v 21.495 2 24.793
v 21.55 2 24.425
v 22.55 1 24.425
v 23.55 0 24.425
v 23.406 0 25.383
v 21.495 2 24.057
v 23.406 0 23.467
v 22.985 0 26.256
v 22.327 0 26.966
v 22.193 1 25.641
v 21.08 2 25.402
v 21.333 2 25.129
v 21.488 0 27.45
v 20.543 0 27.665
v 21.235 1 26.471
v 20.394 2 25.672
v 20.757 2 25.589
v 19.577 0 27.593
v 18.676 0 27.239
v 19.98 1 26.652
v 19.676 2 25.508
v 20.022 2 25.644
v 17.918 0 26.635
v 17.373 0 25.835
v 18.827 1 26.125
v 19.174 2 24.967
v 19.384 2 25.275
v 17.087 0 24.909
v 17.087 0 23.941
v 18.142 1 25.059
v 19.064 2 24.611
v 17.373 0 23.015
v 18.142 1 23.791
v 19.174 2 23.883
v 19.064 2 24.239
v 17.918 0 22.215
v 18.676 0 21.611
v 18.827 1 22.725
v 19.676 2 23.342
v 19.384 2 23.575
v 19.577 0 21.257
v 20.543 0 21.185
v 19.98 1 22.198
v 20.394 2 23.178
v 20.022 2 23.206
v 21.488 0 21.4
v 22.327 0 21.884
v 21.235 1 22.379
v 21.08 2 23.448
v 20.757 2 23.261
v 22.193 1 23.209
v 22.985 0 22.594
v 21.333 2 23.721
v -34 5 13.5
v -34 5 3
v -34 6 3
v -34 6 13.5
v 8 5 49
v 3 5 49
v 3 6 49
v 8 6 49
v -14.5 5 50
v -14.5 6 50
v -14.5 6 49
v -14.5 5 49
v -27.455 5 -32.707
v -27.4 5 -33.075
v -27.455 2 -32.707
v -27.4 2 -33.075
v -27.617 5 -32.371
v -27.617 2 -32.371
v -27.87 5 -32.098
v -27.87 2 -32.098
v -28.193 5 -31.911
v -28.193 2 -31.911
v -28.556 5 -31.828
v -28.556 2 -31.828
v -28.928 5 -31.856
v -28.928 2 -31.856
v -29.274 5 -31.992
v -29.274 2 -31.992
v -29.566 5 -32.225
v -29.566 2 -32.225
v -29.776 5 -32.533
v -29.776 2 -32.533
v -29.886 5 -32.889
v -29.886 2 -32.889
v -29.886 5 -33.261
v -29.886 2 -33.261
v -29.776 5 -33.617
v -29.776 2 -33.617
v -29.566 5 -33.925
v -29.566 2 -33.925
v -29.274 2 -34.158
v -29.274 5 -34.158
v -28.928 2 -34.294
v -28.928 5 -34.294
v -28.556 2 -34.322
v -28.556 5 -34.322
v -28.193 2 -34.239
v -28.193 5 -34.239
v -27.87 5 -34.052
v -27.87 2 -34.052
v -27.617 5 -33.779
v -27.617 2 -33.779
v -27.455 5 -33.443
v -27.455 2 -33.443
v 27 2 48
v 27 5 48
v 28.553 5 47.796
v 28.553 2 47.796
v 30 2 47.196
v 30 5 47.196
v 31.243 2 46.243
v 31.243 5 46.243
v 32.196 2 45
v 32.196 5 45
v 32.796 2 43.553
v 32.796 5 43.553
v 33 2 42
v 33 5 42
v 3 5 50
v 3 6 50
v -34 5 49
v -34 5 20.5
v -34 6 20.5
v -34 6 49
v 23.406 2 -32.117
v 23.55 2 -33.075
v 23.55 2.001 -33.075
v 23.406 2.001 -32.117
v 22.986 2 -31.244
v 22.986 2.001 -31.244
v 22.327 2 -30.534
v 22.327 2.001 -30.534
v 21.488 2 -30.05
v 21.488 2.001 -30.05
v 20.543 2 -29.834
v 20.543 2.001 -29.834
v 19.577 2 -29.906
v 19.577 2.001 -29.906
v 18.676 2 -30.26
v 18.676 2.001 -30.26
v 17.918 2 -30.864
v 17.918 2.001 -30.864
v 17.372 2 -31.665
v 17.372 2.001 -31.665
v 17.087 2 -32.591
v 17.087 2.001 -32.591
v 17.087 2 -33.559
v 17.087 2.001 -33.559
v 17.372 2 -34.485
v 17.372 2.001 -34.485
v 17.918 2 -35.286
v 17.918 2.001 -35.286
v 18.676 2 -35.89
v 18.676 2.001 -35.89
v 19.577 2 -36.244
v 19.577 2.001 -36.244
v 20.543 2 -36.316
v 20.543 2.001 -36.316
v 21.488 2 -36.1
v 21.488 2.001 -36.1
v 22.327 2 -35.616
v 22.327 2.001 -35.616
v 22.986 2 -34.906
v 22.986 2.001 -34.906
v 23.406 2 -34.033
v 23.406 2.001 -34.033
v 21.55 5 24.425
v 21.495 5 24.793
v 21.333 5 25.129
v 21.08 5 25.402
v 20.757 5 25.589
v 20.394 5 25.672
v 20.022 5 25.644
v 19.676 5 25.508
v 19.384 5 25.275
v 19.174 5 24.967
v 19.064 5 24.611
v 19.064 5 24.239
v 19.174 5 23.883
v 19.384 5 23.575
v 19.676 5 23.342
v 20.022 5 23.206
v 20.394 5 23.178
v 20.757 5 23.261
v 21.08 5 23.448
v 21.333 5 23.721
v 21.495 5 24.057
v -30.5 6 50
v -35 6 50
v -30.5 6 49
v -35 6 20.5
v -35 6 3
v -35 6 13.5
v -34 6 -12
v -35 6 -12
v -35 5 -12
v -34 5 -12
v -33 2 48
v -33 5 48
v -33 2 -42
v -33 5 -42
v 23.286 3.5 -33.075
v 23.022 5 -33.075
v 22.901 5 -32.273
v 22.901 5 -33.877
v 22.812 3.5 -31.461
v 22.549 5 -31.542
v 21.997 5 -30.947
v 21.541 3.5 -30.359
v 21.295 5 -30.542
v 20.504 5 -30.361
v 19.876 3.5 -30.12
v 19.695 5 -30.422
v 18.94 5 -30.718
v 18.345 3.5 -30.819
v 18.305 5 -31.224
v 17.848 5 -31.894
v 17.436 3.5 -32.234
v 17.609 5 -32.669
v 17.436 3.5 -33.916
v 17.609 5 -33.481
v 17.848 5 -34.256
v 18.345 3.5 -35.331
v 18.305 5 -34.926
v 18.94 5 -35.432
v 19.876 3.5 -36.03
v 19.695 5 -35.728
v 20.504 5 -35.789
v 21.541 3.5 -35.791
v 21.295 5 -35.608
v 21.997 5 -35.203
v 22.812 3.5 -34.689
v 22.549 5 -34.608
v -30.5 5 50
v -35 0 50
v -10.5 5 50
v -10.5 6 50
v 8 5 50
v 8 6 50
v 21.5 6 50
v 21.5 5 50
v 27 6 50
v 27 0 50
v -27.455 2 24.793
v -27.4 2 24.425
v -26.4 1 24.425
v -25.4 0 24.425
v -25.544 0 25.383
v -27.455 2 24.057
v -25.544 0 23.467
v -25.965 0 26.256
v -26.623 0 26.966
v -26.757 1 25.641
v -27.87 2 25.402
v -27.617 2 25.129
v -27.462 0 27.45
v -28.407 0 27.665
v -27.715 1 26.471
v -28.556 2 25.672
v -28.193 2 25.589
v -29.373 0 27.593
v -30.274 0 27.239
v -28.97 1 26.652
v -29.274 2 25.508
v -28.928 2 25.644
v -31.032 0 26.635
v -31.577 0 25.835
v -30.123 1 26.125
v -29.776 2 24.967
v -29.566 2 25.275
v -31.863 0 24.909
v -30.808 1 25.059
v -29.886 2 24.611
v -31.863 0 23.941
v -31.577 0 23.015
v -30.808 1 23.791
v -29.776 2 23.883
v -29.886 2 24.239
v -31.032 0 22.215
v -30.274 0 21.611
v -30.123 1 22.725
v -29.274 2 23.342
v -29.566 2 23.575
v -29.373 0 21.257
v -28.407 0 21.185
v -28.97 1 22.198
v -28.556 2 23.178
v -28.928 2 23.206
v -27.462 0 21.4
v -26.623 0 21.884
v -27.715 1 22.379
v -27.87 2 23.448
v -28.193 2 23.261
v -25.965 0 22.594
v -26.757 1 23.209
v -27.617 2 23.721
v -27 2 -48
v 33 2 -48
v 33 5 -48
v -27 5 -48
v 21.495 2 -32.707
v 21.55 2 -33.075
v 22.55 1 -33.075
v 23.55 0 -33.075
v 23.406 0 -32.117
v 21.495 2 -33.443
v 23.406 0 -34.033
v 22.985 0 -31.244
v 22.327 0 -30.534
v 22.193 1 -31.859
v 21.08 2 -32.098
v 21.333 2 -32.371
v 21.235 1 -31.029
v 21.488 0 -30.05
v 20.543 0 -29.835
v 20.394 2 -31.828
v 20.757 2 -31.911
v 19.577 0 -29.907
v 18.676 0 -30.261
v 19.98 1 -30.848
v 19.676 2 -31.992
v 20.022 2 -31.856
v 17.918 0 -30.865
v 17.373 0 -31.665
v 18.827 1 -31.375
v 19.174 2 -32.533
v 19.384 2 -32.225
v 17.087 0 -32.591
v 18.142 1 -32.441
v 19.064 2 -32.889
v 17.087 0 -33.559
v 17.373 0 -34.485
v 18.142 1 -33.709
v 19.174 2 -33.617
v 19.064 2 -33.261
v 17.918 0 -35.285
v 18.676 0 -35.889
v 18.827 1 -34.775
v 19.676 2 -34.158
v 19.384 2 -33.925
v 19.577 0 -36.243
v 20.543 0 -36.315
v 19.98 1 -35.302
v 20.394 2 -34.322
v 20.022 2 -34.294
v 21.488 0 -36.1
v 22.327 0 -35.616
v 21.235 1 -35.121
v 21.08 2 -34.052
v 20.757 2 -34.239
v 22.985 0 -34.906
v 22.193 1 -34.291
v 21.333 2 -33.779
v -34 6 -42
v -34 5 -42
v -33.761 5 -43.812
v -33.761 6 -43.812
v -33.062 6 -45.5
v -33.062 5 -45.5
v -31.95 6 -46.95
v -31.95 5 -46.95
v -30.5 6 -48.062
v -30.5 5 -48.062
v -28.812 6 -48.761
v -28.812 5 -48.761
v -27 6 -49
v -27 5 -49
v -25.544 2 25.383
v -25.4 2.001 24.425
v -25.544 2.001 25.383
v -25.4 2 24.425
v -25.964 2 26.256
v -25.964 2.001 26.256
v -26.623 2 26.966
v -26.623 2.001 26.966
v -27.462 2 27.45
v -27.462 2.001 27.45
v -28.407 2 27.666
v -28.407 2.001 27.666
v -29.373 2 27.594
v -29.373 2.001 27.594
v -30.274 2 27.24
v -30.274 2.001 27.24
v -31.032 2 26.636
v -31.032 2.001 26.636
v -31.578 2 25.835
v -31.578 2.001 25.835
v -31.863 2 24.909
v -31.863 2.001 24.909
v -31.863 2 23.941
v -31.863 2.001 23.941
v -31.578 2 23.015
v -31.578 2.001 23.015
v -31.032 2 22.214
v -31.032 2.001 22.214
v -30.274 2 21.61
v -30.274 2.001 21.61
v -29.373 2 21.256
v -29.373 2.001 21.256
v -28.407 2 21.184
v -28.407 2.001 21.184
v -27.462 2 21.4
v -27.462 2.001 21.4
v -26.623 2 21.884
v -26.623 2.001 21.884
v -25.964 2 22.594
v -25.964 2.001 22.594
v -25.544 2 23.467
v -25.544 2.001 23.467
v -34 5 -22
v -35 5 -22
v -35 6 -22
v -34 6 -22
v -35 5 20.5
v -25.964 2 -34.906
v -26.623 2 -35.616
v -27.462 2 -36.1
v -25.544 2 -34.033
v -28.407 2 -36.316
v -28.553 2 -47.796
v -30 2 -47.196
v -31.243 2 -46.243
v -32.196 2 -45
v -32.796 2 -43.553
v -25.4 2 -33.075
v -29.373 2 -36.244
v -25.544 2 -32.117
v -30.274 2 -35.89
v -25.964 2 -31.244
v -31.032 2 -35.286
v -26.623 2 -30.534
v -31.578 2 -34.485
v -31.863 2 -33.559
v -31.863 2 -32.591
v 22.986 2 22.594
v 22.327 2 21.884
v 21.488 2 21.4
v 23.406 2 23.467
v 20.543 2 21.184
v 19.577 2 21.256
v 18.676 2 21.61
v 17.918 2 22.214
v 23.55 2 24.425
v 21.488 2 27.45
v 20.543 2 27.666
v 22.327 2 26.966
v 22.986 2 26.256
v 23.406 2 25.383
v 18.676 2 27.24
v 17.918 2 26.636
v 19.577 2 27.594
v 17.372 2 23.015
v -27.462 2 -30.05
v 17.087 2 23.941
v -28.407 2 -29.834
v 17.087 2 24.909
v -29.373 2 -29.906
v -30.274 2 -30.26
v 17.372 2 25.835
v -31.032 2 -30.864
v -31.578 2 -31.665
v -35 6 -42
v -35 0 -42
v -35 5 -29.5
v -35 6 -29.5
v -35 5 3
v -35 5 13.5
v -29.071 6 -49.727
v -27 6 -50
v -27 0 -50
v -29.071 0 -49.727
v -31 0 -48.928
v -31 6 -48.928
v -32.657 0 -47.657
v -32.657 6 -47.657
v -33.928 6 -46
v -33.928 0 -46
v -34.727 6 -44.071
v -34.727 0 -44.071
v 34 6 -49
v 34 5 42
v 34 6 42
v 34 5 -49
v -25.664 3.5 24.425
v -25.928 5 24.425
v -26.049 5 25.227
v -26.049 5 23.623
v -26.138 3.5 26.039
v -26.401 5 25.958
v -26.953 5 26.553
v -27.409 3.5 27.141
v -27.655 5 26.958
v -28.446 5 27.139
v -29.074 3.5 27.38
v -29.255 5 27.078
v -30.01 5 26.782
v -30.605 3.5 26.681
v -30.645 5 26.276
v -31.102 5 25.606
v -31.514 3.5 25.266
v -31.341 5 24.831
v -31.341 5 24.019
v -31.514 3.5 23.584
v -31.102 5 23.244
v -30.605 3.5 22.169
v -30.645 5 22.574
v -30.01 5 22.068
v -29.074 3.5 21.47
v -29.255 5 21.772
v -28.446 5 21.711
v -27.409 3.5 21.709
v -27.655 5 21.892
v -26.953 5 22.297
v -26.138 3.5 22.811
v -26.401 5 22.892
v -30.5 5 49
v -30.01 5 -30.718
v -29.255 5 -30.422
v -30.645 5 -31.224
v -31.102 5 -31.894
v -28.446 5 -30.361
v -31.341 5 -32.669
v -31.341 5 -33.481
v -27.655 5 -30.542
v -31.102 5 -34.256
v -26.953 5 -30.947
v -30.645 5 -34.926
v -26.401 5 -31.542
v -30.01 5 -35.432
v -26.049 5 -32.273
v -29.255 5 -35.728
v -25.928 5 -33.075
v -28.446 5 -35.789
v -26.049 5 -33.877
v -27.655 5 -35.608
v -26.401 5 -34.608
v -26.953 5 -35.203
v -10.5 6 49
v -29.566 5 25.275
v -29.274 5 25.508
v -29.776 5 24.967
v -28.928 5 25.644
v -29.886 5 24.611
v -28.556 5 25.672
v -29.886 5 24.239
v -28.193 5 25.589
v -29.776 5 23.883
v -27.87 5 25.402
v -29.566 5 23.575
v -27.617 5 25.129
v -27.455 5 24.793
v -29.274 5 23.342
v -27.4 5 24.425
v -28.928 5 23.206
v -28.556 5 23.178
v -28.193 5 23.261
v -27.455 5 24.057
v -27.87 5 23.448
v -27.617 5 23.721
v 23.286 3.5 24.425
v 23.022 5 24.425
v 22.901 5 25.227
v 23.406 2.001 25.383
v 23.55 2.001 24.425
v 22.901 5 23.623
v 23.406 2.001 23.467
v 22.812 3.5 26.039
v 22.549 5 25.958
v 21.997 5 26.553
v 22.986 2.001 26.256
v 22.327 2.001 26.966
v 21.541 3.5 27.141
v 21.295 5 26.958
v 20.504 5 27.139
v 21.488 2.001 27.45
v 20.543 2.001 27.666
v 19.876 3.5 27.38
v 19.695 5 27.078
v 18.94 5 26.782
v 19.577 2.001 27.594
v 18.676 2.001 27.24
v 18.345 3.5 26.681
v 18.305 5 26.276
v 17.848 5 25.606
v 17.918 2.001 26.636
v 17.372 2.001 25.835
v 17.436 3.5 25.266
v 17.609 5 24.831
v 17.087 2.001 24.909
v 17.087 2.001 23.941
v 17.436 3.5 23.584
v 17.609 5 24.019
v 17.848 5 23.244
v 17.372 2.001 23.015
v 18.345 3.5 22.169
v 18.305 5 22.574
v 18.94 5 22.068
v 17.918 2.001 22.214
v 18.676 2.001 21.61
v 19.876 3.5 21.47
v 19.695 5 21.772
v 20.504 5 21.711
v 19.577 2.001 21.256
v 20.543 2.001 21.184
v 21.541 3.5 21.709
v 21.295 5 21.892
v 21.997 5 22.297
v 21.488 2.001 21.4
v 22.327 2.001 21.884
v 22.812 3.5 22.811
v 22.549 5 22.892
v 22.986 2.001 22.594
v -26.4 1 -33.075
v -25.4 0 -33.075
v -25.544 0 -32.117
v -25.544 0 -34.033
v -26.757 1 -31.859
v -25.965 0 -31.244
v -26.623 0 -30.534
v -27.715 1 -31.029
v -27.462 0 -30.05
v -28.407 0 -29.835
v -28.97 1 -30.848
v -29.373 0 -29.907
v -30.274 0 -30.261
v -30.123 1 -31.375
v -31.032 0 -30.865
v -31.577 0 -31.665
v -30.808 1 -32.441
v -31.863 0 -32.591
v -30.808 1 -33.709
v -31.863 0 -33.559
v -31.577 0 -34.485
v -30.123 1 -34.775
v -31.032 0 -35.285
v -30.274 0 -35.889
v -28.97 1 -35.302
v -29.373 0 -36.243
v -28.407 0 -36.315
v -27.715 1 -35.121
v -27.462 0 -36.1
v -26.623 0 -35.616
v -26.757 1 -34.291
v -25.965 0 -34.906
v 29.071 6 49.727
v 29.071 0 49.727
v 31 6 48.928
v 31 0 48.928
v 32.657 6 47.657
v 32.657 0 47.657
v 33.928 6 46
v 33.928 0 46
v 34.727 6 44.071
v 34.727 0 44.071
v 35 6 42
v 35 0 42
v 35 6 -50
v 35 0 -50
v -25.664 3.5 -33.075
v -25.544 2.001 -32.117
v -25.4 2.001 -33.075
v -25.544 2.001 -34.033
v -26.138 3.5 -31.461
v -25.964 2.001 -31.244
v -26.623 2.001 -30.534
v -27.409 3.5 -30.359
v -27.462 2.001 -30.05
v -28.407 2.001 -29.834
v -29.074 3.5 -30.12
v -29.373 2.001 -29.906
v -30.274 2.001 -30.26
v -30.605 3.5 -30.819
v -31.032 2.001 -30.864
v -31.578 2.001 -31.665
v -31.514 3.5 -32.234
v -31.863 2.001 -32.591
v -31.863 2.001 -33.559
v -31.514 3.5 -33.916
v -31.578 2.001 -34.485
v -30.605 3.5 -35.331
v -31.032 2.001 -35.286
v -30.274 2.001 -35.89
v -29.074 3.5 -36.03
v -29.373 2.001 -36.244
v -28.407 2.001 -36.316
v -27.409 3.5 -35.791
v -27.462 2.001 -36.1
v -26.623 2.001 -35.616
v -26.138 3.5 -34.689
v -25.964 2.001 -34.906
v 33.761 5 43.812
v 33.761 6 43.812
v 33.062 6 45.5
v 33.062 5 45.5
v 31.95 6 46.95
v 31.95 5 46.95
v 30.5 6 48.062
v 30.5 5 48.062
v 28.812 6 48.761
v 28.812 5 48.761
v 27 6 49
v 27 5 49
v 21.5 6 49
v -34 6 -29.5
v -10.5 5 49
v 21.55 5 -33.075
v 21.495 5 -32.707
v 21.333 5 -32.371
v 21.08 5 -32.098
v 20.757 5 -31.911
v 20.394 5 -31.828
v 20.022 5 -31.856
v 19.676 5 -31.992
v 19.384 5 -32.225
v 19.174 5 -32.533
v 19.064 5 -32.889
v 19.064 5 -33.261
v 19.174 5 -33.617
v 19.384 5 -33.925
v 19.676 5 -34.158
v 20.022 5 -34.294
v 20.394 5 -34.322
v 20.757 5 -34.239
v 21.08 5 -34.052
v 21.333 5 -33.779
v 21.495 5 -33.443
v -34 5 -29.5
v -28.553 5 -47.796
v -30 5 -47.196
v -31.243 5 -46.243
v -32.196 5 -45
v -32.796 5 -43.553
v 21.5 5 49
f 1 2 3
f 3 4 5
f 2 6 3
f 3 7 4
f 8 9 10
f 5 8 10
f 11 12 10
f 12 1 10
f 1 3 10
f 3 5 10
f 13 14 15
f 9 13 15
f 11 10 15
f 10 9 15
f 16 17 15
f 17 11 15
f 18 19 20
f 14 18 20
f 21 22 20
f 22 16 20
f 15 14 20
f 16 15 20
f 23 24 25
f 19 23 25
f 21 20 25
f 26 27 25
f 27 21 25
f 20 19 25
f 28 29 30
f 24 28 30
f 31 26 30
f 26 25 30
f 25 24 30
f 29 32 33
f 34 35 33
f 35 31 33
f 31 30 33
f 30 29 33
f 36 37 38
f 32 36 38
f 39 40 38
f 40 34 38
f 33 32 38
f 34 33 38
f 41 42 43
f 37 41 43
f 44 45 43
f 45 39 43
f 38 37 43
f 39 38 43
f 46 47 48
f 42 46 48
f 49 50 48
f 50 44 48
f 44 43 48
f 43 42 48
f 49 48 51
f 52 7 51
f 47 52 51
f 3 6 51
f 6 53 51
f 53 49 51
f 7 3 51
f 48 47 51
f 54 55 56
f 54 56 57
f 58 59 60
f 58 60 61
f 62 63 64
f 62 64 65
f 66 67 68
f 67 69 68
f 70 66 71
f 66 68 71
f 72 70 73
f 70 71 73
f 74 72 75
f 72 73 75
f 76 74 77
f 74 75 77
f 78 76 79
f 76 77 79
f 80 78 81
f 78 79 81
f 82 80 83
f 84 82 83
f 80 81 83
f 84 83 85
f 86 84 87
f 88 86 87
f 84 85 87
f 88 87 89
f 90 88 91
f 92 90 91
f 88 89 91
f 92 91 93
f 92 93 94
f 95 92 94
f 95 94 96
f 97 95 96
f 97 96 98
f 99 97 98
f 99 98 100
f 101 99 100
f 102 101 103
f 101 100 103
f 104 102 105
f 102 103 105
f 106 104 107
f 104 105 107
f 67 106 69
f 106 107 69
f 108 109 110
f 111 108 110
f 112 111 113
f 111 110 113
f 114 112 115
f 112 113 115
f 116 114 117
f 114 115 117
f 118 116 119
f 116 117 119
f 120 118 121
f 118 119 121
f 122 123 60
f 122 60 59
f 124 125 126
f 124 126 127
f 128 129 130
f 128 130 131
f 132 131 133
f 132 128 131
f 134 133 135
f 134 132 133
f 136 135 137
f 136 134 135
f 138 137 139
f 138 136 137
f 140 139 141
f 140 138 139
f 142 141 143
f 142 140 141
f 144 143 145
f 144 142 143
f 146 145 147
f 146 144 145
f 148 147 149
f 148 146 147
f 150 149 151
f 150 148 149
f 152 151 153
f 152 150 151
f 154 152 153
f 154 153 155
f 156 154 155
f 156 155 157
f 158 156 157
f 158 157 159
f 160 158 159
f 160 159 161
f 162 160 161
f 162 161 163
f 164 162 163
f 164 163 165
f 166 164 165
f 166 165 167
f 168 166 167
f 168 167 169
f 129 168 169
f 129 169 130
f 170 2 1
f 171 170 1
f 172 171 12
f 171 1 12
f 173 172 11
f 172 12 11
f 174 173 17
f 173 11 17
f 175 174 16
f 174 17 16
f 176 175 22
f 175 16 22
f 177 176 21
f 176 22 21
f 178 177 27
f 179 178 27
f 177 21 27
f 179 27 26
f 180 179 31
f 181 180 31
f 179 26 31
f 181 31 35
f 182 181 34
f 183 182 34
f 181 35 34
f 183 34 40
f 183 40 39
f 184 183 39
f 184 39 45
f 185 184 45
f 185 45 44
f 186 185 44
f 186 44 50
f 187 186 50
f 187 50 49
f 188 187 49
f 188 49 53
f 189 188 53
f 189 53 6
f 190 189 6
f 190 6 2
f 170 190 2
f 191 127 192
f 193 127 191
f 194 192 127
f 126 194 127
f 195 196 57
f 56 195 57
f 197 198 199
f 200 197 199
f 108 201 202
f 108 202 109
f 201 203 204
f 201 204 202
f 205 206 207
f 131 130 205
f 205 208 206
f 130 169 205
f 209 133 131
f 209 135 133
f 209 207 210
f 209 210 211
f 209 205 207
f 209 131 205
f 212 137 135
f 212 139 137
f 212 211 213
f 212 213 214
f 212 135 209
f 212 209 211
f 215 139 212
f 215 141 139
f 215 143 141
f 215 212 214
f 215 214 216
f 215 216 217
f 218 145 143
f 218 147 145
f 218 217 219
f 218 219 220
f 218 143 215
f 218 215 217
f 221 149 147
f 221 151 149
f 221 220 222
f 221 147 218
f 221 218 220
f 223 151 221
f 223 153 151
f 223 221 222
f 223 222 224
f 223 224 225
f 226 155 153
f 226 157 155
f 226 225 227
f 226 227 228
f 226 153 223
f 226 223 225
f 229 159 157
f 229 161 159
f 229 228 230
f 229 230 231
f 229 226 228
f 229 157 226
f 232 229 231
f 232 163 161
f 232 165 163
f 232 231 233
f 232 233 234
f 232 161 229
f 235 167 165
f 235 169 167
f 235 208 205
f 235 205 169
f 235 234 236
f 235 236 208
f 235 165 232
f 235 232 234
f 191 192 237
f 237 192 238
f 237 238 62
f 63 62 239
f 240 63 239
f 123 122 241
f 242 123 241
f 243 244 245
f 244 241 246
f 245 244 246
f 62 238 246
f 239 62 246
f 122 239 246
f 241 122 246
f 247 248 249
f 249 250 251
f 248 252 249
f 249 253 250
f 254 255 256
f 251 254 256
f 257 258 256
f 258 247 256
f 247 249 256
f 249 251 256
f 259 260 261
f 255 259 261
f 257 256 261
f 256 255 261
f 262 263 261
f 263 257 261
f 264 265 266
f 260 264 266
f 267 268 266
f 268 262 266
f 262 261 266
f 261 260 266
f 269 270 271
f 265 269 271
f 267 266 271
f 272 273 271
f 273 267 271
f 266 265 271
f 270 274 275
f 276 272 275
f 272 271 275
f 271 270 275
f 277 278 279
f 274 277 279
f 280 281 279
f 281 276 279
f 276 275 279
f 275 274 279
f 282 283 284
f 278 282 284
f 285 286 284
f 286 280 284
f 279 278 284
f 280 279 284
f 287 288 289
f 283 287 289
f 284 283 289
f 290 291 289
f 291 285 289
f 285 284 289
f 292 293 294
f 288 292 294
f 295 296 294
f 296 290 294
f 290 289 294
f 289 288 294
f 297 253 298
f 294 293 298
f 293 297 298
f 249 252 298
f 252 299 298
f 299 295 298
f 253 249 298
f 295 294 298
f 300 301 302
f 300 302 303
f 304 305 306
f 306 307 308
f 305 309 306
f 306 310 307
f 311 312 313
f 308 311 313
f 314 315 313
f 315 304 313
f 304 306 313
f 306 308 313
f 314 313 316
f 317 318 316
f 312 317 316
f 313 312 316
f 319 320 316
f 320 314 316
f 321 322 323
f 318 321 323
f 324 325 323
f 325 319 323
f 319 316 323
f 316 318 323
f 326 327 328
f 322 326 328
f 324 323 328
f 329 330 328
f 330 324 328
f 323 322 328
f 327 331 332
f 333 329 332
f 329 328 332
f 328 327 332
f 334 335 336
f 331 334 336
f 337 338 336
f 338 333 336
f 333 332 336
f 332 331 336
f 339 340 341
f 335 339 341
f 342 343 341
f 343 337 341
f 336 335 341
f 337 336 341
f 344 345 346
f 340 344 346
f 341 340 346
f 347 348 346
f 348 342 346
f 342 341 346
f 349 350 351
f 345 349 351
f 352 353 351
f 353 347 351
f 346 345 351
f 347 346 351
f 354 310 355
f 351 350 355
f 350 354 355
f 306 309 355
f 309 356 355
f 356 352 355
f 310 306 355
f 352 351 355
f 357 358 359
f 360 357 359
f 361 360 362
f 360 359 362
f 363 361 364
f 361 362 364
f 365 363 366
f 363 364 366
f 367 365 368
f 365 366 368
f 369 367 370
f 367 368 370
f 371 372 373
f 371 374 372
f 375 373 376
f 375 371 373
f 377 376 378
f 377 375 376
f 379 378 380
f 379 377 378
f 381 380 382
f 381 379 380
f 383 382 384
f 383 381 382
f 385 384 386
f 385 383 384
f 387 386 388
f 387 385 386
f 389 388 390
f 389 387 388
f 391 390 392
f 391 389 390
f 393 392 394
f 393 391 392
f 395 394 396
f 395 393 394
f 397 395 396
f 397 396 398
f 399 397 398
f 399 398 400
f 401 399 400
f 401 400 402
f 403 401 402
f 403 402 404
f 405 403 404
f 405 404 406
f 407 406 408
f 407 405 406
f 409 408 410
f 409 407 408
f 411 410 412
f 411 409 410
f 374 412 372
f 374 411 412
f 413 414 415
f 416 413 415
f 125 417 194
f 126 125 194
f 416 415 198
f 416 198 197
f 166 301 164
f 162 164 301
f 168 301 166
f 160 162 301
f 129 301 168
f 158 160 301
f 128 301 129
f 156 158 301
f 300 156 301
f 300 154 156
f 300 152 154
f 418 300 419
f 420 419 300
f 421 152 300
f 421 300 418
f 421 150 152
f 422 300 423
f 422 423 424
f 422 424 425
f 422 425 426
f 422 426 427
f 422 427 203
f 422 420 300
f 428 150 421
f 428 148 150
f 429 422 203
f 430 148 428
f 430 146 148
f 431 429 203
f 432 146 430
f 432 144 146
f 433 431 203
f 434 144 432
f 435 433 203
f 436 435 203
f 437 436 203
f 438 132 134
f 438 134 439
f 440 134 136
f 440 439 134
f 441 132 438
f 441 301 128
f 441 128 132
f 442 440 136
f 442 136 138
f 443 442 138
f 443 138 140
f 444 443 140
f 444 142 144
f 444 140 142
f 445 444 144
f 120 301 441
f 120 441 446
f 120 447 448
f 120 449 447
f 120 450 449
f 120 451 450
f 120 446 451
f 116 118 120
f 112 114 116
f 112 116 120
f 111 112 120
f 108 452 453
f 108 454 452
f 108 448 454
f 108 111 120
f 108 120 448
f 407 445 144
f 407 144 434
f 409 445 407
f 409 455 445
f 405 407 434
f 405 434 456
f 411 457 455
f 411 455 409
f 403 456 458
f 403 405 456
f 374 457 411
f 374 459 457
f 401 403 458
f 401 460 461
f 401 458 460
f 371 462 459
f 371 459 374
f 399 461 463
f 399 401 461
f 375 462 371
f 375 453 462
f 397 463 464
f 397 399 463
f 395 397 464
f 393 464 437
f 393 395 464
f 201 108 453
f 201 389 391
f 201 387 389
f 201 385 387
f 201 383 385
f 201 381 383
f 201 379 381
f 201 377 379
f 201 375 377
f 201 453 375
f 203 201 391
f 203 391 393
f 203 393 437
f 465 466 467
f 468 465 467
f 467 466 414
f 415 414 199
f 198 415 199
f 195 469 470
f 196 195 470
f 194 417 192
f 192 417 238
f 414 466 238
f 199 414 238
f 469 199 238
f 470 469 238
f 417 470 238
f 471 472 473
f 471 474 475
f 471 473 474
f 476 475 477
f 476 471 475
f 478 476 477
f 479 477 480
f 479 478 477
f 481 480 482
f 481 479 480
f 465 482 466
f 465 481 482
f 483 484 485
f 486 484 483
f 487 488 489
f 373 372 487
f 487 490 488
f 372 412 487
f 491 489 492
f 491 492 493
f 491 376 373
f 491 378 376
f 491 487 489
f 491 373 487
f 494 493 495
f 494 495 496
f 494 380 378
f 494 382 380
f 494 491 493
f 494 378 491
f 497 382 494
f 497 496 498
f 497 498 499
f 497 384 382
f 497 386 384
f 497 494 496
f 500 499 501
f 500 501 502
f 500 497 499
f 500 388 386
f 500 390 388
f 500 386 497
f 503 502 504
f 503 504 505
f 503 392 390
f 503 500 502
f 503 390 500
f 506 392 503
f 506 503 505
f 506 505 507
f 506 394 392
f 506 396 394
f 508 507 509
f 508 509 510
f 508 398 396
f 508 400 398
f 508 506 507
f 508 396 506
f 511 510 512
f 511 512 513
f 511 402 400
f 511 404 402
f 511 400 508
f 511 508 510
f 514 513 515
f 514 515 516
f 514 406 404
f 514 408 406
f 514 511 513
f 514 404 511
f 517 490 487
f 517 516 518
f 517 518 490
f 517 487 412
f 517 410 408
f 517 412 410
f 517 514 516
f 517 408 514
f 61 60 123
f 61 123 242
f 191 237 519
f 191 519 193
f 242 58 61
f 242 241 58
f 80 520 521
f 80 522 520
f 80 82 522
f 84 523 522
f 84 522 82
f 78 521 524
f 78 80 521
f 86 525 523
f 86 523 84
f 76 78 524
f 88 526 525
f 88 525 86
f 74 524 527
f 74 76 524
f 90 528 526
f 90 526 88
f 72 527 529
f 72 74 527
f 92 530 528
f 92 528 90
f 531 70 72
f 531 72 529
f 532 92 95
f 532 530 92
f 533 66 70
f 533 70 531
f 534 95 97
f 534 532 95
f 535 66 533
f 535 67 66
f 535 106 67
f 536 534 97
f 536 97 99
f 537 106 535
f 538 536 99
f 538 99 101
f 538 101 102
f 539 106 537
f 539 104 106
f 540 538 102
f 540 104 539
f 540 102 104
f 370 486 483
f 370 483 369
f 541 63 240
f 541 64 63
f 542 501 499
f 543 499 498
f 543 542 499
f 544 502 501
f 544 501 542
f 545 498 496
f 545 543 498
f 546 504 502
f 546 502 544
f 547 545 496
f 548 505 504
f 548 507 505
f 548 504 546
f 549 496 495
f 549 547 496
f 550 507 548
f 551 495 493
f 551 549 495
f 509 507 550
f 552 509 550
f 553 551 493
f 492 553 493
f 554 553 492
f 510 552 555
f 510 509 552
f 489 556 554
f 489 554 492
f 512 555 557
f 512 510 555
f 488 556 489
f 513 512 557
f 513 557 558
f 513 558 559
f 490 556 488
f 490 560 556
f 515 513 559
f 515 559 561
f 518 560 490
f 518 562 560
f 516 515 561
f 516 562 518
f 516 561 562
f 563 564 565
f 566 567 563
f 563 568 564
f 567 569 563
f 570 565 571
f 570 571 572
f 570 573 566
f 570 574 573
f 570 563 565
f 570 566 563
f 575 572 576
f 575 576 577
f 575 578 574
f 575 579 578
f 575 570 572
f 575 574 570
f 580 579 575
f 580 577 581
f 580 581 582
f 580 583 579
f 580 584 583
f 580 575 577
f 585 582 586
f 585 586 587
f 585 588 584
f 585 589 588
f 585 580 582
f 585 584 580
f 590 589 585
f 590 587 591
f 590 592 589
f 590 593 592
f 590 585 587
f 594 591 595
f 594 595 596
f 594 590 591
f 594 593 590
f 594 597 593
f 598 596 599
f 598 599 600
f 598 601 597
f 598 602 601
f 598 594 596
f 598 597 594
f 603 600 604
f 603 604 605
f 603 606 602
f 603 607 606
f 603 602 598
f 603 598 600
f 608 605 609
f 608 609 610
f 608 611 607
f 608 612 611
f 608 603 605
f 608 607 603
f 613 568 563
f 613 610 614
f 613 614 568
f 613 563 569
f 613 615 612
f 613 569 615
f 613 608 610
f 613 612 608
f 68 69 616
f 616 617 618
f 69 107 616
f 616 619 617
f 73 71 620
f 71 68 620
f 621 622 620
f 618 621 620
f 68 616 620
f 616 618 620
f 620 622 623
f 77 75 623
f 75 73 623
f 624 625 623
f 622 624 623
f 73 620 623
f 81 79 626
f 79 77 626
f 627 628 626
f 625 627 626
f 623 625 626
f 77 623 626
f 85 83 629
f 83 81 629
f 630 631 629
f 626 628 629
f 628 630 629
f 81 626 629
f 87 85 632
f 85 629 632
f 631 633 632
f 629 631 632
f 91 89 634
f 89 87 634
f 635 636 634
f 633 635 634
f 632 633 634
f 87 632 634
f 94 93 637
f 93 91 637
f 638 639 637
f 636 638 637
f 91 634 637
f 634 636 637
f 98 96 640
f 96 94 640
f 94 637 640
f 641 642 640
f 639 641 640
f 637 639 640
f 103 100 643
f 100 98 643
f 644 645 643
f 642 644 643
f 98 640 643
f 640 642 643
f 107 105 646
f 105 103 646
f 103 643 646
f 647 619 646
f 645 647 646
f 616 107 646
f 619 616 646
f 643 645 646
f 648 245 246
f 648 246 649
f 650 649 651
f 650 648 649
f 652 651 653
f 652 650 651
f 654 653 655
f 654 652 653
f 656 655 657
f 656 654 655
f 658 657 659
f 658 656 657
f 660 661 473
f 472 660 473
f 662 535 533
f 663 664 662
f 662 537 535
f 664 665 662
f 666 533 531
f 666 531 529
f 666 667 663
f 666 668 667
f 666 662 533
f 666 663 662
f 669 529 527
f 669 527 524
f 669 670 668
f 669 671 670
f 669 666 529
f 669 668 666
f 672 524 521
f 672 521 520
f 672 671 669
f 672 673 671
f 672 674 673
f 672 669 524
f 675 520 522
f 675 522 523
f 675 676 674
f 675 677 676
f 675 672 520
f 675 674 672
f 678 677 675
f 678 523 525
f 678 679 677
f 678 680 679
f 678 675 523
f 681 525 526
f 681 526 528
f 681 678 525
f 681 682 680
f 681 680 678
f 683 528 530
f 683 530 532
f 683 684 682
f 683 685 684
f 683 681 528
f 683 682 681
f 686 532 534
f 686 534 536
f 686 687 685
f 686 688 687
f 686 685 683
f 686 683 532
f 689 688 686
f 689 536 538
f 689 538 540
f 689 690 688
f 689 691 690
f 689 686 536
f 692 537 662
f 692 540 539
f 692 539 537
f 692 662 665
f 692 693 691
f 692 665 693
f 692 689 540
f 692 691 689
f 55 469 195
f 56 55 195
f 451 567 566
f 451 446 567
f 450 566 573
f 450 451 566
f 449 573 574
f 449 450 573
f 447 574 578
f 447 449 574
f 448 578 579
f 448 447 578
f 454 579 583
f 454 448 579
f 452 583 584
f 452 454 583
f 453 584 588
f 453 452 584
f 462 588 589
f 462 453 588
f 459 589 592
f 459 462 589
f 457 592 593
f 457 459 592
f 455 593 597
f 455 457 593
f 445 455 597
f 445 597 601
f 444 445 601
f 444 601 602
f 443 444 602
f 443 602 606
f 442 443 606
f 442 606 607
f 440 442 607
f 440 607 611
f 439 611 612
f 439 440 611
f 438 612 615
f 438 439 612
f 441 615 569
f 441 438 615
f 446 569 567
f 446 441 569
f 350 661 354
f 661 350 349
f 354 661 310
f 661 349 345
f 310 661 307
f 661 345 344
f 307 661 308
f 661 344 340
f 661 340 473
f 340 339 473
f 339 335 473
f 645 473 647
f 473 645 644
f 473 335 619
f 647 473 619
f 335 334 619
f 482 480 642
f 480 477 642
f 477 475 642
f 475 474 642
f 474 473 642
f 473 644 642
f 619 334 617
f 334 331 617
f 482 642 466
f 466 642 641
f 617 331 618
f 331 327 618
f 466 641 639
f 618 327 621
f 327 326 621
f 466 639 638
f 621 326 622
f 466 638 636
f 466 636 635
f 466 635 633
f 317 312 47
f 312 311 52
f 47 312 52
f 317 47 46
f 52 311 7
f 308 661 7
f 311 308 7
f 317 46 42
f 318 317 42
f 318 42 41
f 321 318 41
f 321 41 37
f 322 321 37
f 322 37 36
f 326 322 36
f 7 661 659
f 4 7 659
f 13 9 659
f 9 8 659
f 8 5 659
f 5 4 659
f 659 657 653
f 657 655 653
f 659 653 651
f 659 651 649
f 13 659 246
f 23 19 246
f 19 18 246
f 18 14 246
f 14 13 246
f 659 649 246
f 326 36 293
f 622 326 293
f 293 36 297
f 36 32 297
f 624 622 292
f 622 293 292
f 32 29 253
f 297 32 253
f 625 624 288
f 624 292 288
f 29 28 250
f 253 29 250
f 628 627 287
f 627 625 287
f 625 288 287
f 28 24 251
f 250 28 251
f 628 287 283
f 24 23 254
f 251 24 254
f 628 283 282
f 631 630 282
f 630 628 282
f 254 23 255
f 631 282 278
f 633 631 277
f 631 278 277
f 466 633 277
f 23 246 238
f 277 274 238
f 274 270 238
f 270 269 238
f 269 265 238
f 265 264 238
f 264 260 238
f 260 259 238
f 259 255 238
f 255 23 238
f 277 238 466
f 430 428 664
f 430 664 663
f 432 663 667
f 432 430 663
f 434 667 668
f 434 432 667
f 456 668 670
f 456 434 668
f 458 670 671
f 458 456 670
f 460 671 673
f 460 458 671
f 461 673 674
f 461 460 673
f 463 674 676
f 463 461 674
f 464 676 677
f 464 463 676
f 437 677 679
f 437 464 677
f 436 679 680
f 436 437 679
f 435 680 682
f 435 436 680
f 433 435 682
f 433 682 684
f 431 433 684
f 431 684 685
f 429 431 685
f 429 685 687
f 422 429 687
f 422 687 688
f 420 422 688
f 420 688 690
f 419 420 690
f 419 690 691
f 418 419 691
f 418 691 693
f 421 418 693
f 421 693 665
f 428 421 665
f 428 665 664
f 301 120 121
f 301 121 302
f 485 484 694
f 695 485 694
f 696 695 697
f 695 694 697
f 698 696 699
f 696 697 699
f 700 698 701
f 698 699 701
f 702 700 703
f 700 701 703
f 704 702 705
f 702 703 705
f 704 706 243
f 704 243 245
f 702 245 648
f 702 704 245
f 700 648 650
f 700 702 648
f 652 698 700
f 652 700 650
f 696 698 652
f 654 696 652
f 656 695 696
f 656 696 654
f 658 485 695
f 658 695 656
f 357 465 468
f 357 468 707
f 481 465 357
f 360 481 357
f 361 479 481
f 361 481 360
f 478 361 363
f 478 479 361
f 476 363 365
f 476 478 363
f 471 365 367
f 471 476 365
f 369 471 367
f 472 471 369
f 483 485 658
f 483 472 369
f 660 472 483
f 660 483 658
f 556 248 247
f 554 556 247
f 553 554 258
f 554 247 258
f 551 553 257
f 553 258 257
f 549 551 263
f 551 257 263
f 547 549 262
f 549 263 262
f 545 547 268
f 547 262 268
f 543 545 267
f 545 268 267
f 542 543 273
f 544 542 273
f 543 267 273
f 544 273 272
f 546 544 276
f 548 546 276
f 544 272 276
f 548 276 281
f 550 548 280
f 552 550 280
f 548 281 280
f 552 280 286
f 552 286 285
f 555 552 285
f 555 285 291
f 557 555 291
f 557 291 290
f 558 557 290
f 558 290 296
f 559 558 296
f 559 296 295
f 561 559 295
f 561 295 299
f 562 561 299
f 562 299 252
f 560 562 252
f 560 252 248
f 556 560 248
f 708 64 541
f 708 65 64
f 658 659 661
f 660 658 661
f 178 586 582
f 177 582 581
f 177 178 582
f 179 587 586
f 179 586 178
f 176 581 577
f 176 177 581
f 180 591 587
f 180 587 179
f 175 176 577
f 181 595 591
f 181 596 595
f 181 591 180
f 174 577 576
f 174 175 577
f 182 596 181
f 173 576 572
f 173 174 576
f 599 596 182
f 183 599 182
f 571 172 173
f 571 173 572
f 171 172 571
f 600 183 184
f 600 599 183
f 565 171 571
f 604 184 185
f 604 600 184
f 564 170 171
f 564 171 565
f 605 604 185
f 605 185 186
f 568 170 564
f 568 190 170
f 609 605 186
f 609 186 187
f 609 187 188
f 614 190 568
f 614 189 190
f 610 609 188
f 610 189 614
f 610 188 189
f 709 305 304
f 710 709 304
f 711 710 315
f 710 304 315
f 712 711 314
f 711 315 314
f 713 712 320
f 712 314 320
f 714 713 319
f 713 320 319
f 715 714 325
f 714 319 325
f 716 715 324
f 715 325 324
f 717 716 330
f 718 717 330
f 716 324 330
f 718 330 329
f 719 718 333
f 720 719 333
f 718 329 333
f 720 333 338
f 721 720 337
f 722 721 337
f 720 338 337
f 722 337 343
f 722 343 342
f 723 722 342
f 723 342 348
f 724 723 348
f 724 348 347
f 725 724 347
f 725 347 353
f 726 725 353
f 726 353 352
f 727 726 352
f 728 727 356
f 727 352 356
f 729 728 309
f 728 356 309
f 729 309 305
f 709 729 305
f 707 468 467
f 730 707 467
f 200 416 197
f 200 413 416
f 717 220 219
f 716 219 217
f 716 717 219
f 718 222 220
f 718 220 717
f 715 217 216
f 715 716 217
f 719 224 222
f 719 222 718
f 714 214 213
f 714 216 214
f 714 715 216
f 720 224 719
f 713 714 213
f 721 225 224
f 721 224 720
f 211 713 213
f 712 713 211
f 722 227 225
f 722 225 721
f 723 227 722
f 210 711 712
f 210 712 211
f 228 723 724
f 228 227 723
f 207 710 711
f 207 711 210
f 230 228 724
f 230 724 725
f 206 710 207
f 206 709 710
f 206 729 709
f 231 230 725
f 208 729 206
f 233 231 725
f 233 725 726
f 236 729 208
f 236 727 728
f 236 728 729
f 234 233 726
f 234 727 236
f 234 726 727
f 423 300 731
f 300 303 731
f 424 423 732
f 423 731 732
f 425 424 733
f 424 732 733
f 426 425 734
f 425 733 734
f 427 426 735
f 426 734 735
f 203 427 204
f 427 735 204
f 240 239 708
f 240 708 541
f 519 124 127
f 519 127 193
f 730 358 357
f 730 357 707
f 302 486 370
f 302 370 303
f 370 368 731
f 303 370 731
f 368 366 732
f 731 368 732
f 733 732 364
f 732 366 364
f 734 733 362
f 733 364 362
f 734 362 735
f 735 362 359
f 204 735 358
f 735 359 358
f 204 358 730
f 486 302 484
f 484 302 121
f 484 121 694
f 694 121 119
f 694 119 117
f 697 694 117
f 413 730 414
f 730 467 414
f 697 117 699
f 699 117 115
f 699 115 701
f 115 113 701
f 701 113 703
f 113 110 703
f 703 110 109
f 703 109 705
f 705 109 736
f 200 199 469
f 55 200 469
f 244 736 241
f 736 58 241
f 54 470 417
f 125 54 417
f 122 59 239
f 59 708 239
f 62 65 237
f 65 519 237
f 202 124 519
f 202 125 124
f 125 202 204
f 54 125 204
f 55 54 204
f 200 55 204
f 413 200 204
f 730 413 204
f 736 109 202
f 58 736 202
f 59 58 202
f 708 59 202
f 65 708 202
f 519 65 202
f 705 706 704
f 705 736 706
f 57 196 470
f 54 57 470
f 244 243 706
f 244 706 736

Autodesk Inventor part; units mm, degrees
ref_plane "YZ Plane" through (0, 0, 0) normal (1, 0, 0) x (0, 1, 0)
ref_plane "XZ Plane" through (0, 0, 0) normal (0, 1, 0) x (-1, 0, 0)
ref_plane "XY Plane" through (0, 0, 0) normal (0, 0, 1) x (1, 0, 0)
sketch "base" plane through (0, 0, 0) normal (0, 1, 0) x (-1, 0, 0)
  line L0 (35, 50) -> (-35, 50)
  line L1 (-35, 50) -> (-35, -50)
  line L2 (-35, -50) -> (35, -50)
  line L3 (35, -50) -> (35, 50)
  point P0 (0, 0)
  point P1 (0, 0)
  dimension "d0" = 70
  dimension "d1" = 100
  dimension "d2" = 50
  dimension "d3" = 35
  dimension "d4" = 0
  dimension "d5" = 0
extrude "baseBody" add sketch "base" along normal blind 5
fillet "filletBaseBody" radius 8 2 edges at (-35, 2.5, -50) (35, 2.5, 50)
shell "shellBaseBody" thickness 2 removed faces 1 at (11.6667, 5, -16.6667)
sketch "baseBorderCase" plane through (0, 5, 0) normal (0, 1, 0) x (1, 0, 0)
  line L0 (-35, -50) -> (27, -50)
  line L1 (35, -42) -> (35, 50)
  line L2 (35, 50) -> (-27, 50)
  line L3 (-35, 42) -> (-35, -50)
  arc A0 (-27, 50) -> (-35, 42) centre (-27, 42) ccw
  arc A1 (27, -50) -> (35, -42) centre (27, -42) ccw
  line L4 (-34, -49) -> (27, -49)
  arc A2 (27, -49) -> (34, -42) centre (27, -42) ccw
  line L5 (34, -42) -> (34, 49)
  line L6 (34, 49) -> (-27, 49)
  arc A3 (-27, 49) -> (-34, 42) centre (-27, 42) ccw
  line L7 (-34, 42) -> (-34, -49)
  point P0 (0, 0)
  dimension "d10" = 8
  dimension "d11" = 1
extrude "borderCase" add sketch "baseBorderCase" along normal blind 1
sketch "baseFrontHoles" plane through (-35, 0, 50) normal (0, 0, 1) x (1, 0, 0)
  line L0 (2, 2) -> (2, 5)
  line L1 (2, 2) -> (2, 5) projected
  line L2 (2, 5) -> (4.5, 5)
  line L3 (4.5, 5) -> (4.5, 18.5)
  line L4 (4.5, 18.5) -> (20.5, 18.5)
  line L5 (20.5, 18.5) -> (20.5, 5)
  line L6 (20.5, 5) -> (4.5, 5)
  line L7 (20.5, 5) -> (24.5, 5)
  line L8 (24.5, 5) -> (24.5, 19.5)
  line L9 (24.5, 19.5) -> (38, 19.5)
  line L10 (38, 19.5) -> (38, 5)
  line L11 (38, 5) -> (24.5, 5)
  line L12 (38, 5) -> (43, 5)
  line L13 (43, 5) -> (43, 19.5)
  line L14 (43, 19.5) -> (56.5, 19.5)
  line L15 (56.5, 19.5) -> (56.5, 5)
  line L16 (56.5, 5) -> (43, 5)
  point P0 (35, 0)
  dimension "d14" = 3
  dimension "d15" = 2.5
  dimension "d16" = 13.5
  dimension "d17" = 16
  dimension "d18" = 13.5
  dimension "d19" = 16
  dimension "d20" = 4
  dimension "d21" = 14.5
  dimension "d22" = 13.5
  dimension "d23" = 14.5
  dimension "d24" = 13.5
  dimension "d25" = 5
  dimension "d26" = 14.5
  dimension "d27" = 13.5
  dimension "d28" = 14.5
extrude "frontHoles" cut sketch "baseFrontHoles" against normal up to surface (2 mm away)
sketch "baseLateralHoles" plane through (-35, 0, -42) normal (-1, 0, 0) x (0, 0, 1)
  line L0 (90, 2) -> (90, 5)
  line L1 (90, 2) -> (90, 5) projected
  line L2 (90, 5) -> (62.5, 5)
  line L3 (62.5, 5) -> (62.5, 11)
  line L4 (62.5, 11) -> (55.5, 11)
  line L5 (55.5, 11) -> (55.5, 5)
  line L6 (55.5, 5) -> (62.5, 5)
  line L7 (55.5, 5) -> (45, 5)
  line L8 (45, 5) -> (45, 11)
  line L9 (45, 11) -> (30, 11)
  line L10 (30, 11) -> (30, 5)
  line L11 (30, 5) -> (45, 5)
  line L12 (30, 5) -> (20, 5)
  line L13 (20, 5) -> (20, 8)
  line L14 (20, 8) -> (12.5, 8)
  line L15 (12.5, 8) -> (12.5, 5)
  line L16 (12.5, 5) -> (20, 5)
  point P0 (42, 0)
  dimension "d31" = 3
  dimension "d32" = 27.5
  dimension "d33" = 6
  dimension "d34" = 7
  dimension "d35" = 10.5
  dimension "d36" = 6
  dimension "d37" = 15
  dimension "d38" = 10
  dimension "d39" = 3
  dimension "d40" = 7.5
extrude "lateralHoles" cut sketch "baseLateralHoles" against normal up to surface (2 mm away)
sketch "baseScrewHolders" plane through (-27, 2, -48) normal (0, 1, 0) x (1, 0, 0)
  line L0 (-1.6495, -96) -> (-1.6495, -72.425)
  circle A0 centre (-1.6495, -72.425) radius 1.25
  line L1 (-1.6495, -72.425) -> (47.3005, -72.425)
  line L2 (47.3005, -72.425) -> (47.3005, -14.925)
  line L3 (47.3005, -14.925) -> (-1.6495, -14.925)
  line L4 (-1.6495, -14.925) -> (-1.6495, -72.425)
  circle A1 centre (47.3005, -72.425) radius 1.25
  circle A2 centre (47.3005, -14.925) radius 1.25
  circle A3 centre (-1.6495, -14.925) radius 1.25
  circle A4 centre (-1.6495, -14.925) radius 3.25
  circle A5 centre (47.3005, -14.925) radius 3.25
  circle A6 centre (47.3005, -72.425) radius 3.25
  circle A7 centre (-1.6495, -72.425) radius 3.25
  point P0 (27, -48)
  point P1 (-6, -96)
  dimension "d44" = 23.575
  dimension "d45" = 2.5
  dimension "d46" = 48.95
  dimension "d47" = 57.5
  dimension "d48" = 2.5
  dimension "d49" = 2.5
  dimension "d50" = 2.5
  dimension "d51" = 6.5
  dimension "d52" = 6.5
  dimension "d53" = 6.5
  dimension "d54" = 6.5
  dimension "d74" = 4.3505
extrude "screwHolders" add sketch "baseScrewHolders" along normal blind 3 contours A7 L4 A0 L0 | L0 A0 L1 A7 | A7 L1 A0 L4 | A4 L3 A3 L4 | L4 A3 L3 A4 | A6 L2 A1 L1 | L1 A1 L2 A6 | A5 L2 A2 L3 | L3 A2 L2 A5
extrude "screwHoles" cut sketch "baseScrewHolders" against normal up to next contours A0 L4 L0 | L0 L1 A0 | L4 A0 L1 | A3 L3 L4 | L4 L3 A3 | A1 L2 L1 | L1 L2 A1 | A2 L2 L3 | L3 L2 A2
chamfer "screwHolderChamfler1" distance 3 angle 10 1 edges at (-31.8995, 5, -33.075) measured on face at (-25.41, 4, -32.8135)
chamfer "screwHolderChamfler2" distance 3 angle 10 1 edges at (17.0505, 5, -33.075) measured on face at (23.54, 4, -32.8135)
chamfer "screwHolderChamfler3" distance 3 angle 10 1 edges at (17.0505, 5, 24.425) measured on face at (23.54, 4, 24.6865)
chamfer "screwHolderChamfler4" distance 3 angle 10 1 edges at (-31.8995, 5, 24.425) measured on face at (-25.41, 4, 24.6865)
chamfer "Chamfer5" distance 2 angle 45 4 edges at (19.0505, 0, 24.425) (-29.8995, 0, 24.425) (-29.8995, 0, -33.075) (19.0505, 0, -33.075)
equation "\"d48\" = d45"
equation "\"d49\" = d48"
equation "\"d50\" = d49"
equation "\"d51\" = d52"
equation "\"d52\" = d53"
equation "\"d53\" = d54"
properties part number "bottom"
